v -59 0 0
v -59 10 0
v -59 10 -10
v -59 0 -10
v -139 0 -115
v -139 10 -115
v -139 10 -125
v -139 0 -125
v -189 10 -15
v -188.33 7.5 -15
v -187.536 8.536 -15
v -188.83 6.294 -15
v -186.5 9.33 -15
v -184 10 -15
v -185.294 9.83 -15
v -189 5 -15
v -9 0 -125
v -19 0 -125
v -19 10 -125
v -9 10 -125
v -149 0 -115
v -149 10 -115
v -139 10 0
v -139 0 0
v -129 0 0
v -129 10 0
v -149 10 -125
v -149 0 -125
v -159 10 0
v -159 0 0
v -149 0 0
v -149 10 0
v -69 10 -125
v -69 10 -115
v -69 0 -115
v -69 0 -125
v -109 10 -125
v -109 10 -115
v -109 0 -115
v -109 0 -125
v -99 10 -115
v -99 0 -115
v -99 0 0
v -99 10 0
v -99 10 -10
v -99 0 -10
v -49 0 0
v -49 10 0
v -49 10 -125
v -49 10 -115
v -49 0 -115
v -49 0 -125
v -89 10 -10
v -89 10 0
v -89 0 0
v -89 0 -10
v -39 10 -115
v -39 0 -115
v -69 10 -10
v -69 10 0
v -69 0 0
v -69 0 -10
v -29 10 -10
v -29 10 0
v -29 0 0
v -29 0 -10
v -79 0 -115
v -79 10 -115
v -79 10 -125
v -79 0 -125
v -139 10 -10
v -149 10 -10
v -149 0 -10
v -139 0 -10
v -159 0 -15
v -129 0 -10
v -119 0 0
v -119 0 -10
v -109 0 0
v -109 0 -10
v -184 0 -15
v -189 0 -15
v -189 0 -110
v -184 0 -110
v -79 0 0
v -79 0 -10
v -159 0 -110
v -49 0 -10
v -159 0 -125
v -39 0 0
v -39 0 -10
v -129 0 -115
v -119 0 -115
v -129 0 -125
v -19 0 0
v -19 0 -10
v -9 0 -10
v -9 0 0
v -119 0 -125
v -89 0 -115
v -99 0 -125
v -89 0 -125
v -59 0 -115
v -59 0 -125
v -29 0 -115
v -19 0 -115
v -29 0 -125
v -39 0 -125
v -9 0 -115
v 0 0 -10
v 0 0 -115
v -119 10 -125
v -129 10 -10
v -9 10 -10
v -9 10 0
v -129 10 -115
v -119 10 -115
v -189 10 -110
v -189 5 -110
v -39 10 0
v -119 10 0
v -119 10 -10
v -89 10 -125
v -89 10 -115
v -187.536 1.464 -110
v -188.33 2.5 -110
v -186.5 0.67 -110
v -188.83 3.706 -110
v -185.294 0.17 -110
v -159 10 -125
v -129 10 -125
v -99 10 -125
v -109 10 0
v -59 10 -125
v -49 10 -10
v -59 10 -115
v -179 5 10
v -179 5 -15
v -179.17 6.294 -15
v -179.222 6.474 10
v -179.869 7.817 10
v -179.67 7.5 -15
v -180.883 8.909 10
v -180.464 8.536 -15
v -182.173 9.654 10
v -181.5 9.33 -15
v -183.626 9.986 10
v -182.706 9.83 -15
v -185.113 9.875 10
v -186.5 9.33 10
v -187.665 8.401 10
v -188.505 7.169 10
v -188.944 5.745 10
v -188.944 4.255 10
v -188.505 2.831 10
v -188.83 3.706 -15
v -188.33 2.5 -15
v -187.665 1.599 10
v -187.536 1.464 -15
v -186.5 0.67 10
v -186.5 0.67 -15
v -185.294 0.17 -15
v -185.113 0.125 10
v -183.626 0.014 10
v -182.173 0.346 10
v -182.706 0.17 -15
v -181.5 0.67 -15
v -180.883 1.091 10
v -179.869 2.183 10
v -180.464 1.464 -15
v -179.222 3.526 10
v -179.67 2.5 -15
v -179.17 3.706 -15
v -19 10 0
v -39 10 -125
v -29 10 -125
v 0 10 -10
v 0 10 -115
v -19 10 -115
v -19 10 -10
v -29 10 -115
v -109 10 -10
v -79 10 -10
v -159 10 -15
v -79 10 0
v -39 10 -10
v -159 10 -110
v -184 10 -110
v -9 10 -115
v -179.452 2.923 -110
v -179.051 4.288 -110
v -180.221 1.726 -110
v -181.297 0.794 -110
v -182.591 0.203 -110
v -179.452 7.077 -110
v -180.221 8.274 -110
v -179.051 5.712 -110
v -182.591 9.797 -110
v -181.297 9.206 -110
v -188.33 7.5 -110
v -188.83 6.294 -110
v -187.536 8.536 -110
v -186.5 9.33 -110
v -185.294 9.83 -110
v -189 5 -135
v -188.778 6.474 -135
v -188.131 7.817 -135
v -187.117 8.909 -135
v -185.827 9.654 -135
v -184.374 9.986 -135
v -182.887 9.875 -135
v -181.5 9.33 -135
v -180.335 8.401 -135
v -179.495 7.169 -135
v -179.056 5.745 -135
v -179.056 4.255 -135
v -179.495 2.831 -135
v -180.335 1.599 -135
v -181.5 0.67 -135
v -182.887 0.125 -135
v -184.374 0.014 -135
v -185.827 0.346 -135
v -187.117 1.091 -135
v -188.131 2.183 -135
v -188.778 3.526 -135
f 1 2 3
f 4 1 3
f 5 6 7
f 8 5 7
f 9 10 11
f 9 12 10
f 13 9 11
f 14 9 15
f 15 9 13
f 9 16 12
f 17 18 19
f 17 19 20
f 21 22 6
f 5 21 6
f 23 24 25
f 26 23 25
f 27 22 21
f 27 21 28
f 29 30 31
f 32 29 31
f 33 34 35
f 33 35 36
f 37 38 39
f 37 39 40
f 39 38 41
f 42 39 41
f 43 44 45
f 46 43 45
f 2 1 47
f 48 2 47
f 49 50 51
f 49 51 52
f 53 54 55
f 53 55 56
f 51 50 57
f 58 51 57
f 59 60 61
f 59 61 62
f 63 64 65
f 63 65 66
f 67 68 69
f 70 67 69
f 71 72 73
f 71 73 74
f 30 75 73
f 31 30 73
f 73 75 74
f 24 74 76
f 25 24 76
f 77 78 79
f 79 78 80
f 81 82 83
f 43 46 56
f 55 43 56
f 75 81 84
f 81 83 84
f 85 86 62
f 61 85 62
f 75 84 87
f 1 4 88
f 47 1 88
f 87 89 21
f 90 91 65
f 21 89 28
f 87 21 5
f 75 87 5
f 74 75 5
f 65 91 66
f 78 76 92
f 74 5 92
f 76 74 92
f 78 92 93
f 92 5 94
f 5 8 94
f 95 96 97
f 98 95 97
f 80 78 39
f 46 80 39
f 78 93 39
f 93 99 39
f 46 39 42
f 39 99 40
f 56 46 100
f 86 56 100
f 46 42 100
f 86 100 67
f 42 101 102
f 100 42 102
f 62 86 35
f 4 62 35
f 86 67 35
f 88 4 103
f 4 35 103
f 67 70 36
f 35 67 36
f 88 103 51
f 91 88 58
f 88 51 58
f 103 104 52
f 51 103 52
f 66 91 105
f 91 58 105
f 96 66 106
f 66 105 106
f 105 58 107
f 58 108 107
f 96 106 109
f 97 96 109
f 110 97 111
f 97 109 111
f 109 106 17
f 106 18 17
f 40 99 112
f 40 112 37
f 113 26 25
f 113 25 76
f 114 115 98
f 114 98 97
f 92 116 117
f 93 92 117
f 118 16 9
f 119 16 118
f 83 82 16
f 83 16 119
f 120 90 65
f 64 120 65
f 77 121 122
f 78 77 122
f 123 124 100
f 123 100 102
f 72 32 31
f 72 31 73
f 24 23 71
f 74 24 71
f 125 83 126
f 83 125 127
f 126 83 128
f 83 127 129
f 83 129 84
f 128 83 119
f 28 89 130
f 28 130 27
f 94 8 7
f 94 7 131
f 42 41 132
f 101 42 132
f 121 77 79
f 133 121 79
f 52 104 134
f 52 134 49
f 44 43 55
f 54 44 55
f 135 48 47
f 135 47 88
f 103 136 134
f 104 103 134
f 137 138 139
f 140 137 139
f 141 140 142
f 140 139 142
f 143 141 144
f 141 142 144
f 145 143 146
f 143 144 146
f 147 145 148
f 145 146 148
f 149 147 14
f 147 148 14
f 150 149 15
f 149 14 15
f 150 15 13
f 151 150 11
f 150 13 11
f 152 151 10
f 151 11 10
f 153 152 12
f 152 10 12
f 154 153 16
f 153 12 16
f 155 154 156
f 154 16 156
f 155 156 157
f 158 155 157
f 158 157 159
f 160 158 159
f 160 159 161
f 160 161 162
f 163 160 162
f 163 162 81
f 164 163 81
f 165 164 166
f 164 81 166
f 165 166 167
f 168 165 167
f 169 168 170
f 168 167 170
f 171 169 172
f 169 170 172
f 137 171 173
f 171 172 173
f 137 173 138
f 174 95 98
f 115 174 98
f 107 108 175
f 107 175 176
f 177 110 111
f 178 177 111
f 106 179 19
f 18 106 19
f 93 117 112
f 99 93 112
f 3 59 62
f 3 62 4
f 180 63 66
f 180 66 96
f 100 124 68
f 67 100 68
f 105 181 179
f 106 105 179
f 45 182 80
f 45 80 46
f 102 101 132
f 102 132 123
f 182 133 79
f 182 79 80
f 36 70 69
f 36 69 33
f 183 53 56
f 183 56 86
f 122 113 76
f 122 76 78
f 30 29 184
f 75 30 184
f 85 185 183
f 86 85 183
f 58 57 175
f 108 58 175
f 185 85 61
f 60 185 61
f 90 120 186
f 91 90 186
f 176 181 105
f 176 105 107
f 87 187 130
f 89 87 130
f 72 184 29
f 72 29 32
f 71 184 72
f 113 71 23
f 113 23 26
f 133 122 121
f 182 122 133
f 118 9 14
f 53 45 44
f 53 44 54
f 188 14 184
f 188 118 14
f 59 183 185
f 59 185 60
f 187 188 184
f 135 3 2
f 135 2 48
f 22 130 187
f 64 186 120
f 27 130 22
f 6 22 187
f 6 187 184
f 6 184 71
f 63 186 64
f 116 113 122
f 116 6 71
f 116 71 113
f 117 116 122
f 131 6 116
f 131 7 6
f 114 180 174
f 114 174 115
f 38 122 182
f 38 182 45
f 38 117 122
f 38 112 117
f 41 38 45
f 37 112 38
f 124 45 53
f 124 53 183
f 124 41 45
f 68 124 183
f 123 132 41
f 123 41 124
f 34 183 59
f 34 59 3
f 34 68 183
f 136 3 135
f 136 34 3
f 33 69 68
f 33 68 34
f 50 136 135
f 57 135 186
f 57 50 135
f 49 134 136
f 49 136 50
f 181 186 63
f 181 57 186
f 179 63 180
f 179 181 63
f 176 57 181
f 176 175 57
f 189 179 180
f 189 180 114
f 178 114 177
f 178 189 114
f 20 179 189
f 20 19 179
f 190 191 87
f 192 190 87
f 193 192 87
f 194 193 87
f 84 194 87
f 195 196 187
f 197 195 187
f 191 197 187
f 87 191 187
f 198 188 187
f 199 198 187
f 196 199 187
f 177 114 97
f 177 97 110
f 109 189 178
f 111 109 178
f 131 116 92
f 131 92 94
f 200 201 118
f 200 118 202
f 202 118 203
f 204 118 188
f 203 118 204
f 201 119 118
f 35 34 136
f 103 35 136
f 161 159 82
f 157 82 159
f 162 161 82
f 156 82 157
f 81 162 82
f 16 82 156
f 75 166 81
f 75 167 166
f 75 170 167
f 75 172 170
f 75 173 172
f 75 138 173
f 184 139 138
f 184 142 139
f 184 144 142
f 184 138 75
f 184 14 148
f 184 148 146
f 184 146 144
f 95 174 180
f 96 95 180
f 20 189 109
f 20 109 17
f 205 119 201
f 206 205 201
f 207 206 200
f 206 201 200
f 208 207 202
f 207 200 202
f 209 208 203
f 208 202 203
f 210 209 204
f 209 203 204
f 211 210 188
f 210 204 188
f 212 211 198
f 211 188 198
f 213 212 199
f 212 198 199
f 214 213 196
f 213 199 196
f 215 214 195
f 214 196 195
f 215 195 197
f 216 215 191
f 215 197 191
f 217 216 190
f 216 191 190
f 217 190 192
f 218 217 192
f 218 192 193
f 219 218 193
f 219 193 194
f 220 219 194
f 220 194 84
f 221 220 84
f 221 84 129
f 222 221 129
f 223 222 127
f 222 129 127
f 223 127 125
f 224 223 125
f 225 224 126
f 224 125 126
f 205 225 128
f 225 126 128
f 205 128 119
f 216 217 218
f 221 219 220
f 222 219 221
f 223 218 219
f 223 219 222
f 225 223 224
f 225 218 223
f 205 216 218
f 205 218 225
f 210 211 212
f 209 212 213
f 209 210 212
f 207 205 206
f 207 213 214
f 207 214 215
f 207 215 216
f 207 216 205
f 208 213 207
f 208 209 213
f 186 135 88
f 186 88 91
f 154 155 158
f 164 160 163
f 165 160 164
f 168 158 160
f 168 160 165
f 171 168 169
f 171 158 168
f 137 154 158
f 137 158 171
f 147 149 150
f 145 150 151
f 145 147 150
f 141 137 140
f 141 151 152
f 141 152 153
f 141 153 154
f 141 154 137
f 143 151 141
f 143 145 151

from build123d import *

# Parameters (mm, degrees)
ESQUISSE1_W                = 189
ESQUISSE1_H                = 125
BOSS_EXTRU_1_DEPTH         = 10
ESQUISSE2_W                = 30
ESQUISSE2_H                = 15
ENL_V_MAT_EXTRU_1_DEPTH    = 10
ESQUISSE3_W                = 10
ESQUISSE3_H                = 10
ENL_V_MAT_EXTRU_2_DEPTH    = 10
R_P_TITION_LIN_AIRE1_COUNT = 8
R_P_TITION_LIN_AIRE1_PITCH = 20
ESQUISSE4_R                = 5
BOSS_EXTRU_2_DEPTH         = 25
ESQUISSE5_R                = 5
BOSS_EXTRU_4_DEPTH         = 25


with BuildPart() as part:
    # Esquisse1 → Boss.-Extru.1 (new body)
    with BuildSketch(Plane(origin=(0, 0, 0), x_dir=(1, 0, 0), z_dir=(0, 1, 0))):
        with Locations((-94.5, 62.5)):
            Rectangle(ESQUISSE1_W, ESQUISSE1_H)
    extrude(amount=BOSS_EXTRU_1_DEPTH)

    # Esquisse2 → Enlèv. mat.-Extru.1 (cut)
    with BuildSketch(Plane(origin=(0, 10, 0), x_dir=(1, 0, 0), z_dir=(0, 1, 0))):
        with Locations((-174, 117.5)):
            Rectangle(ESQUISSE2_W, ESQUISSE2_H)
        with Locations((-174, 7.5)):
            Rectangle(ESQUISSE2_W, ESQUISSE2_H)
    extrude(amount=-ENL_V_MAT_EXTRU_1_DEPTH, mode=Mode.SUBTRACT)

    # Esquisse3 → Enlèv. mat.-Extru.2 (cut)
    with BuildSketch(Plane(origin=(0, 10, 0), x_dir=(1, 0, 0), z_dir=(0, 1, 0))):
        with Locations((-144, 120)):
            Rectangle(ESQUISSE3_W, ESQUISSE3_H)
        with Locations((-144, 5)):
            Rectangle(ESQUISSE3_W, ESQUISSE3_H)
    enl_v_mat_extru_2 = extrude(amount=-ENL_V_MAT_EXTRU_2_DEPTH, mode=Mode.SUBTRACT)

    # Répétition linéaire1: Enlèv. mat.-Extru.2 ×8
    with Locations(*[(i * R_P_TITION_LIN_AIRE1_PITCH, 0, 0) for i in range(1, R_P_TITION_LIN_AIRE1_COUNT)]):
        add(enl_v_mat_extru_2, mode=Mode.SUBTRACT)

    # Esquisse4 → Boss.-Extru.2 (add)
    with BuildSketch(Plane.XY.offset(-15)):
        with Locations((-184, 5)):
            Circle(ESQUISSE4_R)
    extrude(amount=BOSS_EXTRU_2_DEPTH)

    # Esquisse5 → Boss.-Extru.4 (add)
    with BuildSketch(Plane(origin=(0, 0, -110), x_dir=(-1, 0, 0), z_dir=(0, 0, -1))):
        with Locations((184, 5)):
            Circle(ESQUISSE5_R)
    extrude(amount=BOSS_EXTRU_4_DEPTH)


solid = part.part
